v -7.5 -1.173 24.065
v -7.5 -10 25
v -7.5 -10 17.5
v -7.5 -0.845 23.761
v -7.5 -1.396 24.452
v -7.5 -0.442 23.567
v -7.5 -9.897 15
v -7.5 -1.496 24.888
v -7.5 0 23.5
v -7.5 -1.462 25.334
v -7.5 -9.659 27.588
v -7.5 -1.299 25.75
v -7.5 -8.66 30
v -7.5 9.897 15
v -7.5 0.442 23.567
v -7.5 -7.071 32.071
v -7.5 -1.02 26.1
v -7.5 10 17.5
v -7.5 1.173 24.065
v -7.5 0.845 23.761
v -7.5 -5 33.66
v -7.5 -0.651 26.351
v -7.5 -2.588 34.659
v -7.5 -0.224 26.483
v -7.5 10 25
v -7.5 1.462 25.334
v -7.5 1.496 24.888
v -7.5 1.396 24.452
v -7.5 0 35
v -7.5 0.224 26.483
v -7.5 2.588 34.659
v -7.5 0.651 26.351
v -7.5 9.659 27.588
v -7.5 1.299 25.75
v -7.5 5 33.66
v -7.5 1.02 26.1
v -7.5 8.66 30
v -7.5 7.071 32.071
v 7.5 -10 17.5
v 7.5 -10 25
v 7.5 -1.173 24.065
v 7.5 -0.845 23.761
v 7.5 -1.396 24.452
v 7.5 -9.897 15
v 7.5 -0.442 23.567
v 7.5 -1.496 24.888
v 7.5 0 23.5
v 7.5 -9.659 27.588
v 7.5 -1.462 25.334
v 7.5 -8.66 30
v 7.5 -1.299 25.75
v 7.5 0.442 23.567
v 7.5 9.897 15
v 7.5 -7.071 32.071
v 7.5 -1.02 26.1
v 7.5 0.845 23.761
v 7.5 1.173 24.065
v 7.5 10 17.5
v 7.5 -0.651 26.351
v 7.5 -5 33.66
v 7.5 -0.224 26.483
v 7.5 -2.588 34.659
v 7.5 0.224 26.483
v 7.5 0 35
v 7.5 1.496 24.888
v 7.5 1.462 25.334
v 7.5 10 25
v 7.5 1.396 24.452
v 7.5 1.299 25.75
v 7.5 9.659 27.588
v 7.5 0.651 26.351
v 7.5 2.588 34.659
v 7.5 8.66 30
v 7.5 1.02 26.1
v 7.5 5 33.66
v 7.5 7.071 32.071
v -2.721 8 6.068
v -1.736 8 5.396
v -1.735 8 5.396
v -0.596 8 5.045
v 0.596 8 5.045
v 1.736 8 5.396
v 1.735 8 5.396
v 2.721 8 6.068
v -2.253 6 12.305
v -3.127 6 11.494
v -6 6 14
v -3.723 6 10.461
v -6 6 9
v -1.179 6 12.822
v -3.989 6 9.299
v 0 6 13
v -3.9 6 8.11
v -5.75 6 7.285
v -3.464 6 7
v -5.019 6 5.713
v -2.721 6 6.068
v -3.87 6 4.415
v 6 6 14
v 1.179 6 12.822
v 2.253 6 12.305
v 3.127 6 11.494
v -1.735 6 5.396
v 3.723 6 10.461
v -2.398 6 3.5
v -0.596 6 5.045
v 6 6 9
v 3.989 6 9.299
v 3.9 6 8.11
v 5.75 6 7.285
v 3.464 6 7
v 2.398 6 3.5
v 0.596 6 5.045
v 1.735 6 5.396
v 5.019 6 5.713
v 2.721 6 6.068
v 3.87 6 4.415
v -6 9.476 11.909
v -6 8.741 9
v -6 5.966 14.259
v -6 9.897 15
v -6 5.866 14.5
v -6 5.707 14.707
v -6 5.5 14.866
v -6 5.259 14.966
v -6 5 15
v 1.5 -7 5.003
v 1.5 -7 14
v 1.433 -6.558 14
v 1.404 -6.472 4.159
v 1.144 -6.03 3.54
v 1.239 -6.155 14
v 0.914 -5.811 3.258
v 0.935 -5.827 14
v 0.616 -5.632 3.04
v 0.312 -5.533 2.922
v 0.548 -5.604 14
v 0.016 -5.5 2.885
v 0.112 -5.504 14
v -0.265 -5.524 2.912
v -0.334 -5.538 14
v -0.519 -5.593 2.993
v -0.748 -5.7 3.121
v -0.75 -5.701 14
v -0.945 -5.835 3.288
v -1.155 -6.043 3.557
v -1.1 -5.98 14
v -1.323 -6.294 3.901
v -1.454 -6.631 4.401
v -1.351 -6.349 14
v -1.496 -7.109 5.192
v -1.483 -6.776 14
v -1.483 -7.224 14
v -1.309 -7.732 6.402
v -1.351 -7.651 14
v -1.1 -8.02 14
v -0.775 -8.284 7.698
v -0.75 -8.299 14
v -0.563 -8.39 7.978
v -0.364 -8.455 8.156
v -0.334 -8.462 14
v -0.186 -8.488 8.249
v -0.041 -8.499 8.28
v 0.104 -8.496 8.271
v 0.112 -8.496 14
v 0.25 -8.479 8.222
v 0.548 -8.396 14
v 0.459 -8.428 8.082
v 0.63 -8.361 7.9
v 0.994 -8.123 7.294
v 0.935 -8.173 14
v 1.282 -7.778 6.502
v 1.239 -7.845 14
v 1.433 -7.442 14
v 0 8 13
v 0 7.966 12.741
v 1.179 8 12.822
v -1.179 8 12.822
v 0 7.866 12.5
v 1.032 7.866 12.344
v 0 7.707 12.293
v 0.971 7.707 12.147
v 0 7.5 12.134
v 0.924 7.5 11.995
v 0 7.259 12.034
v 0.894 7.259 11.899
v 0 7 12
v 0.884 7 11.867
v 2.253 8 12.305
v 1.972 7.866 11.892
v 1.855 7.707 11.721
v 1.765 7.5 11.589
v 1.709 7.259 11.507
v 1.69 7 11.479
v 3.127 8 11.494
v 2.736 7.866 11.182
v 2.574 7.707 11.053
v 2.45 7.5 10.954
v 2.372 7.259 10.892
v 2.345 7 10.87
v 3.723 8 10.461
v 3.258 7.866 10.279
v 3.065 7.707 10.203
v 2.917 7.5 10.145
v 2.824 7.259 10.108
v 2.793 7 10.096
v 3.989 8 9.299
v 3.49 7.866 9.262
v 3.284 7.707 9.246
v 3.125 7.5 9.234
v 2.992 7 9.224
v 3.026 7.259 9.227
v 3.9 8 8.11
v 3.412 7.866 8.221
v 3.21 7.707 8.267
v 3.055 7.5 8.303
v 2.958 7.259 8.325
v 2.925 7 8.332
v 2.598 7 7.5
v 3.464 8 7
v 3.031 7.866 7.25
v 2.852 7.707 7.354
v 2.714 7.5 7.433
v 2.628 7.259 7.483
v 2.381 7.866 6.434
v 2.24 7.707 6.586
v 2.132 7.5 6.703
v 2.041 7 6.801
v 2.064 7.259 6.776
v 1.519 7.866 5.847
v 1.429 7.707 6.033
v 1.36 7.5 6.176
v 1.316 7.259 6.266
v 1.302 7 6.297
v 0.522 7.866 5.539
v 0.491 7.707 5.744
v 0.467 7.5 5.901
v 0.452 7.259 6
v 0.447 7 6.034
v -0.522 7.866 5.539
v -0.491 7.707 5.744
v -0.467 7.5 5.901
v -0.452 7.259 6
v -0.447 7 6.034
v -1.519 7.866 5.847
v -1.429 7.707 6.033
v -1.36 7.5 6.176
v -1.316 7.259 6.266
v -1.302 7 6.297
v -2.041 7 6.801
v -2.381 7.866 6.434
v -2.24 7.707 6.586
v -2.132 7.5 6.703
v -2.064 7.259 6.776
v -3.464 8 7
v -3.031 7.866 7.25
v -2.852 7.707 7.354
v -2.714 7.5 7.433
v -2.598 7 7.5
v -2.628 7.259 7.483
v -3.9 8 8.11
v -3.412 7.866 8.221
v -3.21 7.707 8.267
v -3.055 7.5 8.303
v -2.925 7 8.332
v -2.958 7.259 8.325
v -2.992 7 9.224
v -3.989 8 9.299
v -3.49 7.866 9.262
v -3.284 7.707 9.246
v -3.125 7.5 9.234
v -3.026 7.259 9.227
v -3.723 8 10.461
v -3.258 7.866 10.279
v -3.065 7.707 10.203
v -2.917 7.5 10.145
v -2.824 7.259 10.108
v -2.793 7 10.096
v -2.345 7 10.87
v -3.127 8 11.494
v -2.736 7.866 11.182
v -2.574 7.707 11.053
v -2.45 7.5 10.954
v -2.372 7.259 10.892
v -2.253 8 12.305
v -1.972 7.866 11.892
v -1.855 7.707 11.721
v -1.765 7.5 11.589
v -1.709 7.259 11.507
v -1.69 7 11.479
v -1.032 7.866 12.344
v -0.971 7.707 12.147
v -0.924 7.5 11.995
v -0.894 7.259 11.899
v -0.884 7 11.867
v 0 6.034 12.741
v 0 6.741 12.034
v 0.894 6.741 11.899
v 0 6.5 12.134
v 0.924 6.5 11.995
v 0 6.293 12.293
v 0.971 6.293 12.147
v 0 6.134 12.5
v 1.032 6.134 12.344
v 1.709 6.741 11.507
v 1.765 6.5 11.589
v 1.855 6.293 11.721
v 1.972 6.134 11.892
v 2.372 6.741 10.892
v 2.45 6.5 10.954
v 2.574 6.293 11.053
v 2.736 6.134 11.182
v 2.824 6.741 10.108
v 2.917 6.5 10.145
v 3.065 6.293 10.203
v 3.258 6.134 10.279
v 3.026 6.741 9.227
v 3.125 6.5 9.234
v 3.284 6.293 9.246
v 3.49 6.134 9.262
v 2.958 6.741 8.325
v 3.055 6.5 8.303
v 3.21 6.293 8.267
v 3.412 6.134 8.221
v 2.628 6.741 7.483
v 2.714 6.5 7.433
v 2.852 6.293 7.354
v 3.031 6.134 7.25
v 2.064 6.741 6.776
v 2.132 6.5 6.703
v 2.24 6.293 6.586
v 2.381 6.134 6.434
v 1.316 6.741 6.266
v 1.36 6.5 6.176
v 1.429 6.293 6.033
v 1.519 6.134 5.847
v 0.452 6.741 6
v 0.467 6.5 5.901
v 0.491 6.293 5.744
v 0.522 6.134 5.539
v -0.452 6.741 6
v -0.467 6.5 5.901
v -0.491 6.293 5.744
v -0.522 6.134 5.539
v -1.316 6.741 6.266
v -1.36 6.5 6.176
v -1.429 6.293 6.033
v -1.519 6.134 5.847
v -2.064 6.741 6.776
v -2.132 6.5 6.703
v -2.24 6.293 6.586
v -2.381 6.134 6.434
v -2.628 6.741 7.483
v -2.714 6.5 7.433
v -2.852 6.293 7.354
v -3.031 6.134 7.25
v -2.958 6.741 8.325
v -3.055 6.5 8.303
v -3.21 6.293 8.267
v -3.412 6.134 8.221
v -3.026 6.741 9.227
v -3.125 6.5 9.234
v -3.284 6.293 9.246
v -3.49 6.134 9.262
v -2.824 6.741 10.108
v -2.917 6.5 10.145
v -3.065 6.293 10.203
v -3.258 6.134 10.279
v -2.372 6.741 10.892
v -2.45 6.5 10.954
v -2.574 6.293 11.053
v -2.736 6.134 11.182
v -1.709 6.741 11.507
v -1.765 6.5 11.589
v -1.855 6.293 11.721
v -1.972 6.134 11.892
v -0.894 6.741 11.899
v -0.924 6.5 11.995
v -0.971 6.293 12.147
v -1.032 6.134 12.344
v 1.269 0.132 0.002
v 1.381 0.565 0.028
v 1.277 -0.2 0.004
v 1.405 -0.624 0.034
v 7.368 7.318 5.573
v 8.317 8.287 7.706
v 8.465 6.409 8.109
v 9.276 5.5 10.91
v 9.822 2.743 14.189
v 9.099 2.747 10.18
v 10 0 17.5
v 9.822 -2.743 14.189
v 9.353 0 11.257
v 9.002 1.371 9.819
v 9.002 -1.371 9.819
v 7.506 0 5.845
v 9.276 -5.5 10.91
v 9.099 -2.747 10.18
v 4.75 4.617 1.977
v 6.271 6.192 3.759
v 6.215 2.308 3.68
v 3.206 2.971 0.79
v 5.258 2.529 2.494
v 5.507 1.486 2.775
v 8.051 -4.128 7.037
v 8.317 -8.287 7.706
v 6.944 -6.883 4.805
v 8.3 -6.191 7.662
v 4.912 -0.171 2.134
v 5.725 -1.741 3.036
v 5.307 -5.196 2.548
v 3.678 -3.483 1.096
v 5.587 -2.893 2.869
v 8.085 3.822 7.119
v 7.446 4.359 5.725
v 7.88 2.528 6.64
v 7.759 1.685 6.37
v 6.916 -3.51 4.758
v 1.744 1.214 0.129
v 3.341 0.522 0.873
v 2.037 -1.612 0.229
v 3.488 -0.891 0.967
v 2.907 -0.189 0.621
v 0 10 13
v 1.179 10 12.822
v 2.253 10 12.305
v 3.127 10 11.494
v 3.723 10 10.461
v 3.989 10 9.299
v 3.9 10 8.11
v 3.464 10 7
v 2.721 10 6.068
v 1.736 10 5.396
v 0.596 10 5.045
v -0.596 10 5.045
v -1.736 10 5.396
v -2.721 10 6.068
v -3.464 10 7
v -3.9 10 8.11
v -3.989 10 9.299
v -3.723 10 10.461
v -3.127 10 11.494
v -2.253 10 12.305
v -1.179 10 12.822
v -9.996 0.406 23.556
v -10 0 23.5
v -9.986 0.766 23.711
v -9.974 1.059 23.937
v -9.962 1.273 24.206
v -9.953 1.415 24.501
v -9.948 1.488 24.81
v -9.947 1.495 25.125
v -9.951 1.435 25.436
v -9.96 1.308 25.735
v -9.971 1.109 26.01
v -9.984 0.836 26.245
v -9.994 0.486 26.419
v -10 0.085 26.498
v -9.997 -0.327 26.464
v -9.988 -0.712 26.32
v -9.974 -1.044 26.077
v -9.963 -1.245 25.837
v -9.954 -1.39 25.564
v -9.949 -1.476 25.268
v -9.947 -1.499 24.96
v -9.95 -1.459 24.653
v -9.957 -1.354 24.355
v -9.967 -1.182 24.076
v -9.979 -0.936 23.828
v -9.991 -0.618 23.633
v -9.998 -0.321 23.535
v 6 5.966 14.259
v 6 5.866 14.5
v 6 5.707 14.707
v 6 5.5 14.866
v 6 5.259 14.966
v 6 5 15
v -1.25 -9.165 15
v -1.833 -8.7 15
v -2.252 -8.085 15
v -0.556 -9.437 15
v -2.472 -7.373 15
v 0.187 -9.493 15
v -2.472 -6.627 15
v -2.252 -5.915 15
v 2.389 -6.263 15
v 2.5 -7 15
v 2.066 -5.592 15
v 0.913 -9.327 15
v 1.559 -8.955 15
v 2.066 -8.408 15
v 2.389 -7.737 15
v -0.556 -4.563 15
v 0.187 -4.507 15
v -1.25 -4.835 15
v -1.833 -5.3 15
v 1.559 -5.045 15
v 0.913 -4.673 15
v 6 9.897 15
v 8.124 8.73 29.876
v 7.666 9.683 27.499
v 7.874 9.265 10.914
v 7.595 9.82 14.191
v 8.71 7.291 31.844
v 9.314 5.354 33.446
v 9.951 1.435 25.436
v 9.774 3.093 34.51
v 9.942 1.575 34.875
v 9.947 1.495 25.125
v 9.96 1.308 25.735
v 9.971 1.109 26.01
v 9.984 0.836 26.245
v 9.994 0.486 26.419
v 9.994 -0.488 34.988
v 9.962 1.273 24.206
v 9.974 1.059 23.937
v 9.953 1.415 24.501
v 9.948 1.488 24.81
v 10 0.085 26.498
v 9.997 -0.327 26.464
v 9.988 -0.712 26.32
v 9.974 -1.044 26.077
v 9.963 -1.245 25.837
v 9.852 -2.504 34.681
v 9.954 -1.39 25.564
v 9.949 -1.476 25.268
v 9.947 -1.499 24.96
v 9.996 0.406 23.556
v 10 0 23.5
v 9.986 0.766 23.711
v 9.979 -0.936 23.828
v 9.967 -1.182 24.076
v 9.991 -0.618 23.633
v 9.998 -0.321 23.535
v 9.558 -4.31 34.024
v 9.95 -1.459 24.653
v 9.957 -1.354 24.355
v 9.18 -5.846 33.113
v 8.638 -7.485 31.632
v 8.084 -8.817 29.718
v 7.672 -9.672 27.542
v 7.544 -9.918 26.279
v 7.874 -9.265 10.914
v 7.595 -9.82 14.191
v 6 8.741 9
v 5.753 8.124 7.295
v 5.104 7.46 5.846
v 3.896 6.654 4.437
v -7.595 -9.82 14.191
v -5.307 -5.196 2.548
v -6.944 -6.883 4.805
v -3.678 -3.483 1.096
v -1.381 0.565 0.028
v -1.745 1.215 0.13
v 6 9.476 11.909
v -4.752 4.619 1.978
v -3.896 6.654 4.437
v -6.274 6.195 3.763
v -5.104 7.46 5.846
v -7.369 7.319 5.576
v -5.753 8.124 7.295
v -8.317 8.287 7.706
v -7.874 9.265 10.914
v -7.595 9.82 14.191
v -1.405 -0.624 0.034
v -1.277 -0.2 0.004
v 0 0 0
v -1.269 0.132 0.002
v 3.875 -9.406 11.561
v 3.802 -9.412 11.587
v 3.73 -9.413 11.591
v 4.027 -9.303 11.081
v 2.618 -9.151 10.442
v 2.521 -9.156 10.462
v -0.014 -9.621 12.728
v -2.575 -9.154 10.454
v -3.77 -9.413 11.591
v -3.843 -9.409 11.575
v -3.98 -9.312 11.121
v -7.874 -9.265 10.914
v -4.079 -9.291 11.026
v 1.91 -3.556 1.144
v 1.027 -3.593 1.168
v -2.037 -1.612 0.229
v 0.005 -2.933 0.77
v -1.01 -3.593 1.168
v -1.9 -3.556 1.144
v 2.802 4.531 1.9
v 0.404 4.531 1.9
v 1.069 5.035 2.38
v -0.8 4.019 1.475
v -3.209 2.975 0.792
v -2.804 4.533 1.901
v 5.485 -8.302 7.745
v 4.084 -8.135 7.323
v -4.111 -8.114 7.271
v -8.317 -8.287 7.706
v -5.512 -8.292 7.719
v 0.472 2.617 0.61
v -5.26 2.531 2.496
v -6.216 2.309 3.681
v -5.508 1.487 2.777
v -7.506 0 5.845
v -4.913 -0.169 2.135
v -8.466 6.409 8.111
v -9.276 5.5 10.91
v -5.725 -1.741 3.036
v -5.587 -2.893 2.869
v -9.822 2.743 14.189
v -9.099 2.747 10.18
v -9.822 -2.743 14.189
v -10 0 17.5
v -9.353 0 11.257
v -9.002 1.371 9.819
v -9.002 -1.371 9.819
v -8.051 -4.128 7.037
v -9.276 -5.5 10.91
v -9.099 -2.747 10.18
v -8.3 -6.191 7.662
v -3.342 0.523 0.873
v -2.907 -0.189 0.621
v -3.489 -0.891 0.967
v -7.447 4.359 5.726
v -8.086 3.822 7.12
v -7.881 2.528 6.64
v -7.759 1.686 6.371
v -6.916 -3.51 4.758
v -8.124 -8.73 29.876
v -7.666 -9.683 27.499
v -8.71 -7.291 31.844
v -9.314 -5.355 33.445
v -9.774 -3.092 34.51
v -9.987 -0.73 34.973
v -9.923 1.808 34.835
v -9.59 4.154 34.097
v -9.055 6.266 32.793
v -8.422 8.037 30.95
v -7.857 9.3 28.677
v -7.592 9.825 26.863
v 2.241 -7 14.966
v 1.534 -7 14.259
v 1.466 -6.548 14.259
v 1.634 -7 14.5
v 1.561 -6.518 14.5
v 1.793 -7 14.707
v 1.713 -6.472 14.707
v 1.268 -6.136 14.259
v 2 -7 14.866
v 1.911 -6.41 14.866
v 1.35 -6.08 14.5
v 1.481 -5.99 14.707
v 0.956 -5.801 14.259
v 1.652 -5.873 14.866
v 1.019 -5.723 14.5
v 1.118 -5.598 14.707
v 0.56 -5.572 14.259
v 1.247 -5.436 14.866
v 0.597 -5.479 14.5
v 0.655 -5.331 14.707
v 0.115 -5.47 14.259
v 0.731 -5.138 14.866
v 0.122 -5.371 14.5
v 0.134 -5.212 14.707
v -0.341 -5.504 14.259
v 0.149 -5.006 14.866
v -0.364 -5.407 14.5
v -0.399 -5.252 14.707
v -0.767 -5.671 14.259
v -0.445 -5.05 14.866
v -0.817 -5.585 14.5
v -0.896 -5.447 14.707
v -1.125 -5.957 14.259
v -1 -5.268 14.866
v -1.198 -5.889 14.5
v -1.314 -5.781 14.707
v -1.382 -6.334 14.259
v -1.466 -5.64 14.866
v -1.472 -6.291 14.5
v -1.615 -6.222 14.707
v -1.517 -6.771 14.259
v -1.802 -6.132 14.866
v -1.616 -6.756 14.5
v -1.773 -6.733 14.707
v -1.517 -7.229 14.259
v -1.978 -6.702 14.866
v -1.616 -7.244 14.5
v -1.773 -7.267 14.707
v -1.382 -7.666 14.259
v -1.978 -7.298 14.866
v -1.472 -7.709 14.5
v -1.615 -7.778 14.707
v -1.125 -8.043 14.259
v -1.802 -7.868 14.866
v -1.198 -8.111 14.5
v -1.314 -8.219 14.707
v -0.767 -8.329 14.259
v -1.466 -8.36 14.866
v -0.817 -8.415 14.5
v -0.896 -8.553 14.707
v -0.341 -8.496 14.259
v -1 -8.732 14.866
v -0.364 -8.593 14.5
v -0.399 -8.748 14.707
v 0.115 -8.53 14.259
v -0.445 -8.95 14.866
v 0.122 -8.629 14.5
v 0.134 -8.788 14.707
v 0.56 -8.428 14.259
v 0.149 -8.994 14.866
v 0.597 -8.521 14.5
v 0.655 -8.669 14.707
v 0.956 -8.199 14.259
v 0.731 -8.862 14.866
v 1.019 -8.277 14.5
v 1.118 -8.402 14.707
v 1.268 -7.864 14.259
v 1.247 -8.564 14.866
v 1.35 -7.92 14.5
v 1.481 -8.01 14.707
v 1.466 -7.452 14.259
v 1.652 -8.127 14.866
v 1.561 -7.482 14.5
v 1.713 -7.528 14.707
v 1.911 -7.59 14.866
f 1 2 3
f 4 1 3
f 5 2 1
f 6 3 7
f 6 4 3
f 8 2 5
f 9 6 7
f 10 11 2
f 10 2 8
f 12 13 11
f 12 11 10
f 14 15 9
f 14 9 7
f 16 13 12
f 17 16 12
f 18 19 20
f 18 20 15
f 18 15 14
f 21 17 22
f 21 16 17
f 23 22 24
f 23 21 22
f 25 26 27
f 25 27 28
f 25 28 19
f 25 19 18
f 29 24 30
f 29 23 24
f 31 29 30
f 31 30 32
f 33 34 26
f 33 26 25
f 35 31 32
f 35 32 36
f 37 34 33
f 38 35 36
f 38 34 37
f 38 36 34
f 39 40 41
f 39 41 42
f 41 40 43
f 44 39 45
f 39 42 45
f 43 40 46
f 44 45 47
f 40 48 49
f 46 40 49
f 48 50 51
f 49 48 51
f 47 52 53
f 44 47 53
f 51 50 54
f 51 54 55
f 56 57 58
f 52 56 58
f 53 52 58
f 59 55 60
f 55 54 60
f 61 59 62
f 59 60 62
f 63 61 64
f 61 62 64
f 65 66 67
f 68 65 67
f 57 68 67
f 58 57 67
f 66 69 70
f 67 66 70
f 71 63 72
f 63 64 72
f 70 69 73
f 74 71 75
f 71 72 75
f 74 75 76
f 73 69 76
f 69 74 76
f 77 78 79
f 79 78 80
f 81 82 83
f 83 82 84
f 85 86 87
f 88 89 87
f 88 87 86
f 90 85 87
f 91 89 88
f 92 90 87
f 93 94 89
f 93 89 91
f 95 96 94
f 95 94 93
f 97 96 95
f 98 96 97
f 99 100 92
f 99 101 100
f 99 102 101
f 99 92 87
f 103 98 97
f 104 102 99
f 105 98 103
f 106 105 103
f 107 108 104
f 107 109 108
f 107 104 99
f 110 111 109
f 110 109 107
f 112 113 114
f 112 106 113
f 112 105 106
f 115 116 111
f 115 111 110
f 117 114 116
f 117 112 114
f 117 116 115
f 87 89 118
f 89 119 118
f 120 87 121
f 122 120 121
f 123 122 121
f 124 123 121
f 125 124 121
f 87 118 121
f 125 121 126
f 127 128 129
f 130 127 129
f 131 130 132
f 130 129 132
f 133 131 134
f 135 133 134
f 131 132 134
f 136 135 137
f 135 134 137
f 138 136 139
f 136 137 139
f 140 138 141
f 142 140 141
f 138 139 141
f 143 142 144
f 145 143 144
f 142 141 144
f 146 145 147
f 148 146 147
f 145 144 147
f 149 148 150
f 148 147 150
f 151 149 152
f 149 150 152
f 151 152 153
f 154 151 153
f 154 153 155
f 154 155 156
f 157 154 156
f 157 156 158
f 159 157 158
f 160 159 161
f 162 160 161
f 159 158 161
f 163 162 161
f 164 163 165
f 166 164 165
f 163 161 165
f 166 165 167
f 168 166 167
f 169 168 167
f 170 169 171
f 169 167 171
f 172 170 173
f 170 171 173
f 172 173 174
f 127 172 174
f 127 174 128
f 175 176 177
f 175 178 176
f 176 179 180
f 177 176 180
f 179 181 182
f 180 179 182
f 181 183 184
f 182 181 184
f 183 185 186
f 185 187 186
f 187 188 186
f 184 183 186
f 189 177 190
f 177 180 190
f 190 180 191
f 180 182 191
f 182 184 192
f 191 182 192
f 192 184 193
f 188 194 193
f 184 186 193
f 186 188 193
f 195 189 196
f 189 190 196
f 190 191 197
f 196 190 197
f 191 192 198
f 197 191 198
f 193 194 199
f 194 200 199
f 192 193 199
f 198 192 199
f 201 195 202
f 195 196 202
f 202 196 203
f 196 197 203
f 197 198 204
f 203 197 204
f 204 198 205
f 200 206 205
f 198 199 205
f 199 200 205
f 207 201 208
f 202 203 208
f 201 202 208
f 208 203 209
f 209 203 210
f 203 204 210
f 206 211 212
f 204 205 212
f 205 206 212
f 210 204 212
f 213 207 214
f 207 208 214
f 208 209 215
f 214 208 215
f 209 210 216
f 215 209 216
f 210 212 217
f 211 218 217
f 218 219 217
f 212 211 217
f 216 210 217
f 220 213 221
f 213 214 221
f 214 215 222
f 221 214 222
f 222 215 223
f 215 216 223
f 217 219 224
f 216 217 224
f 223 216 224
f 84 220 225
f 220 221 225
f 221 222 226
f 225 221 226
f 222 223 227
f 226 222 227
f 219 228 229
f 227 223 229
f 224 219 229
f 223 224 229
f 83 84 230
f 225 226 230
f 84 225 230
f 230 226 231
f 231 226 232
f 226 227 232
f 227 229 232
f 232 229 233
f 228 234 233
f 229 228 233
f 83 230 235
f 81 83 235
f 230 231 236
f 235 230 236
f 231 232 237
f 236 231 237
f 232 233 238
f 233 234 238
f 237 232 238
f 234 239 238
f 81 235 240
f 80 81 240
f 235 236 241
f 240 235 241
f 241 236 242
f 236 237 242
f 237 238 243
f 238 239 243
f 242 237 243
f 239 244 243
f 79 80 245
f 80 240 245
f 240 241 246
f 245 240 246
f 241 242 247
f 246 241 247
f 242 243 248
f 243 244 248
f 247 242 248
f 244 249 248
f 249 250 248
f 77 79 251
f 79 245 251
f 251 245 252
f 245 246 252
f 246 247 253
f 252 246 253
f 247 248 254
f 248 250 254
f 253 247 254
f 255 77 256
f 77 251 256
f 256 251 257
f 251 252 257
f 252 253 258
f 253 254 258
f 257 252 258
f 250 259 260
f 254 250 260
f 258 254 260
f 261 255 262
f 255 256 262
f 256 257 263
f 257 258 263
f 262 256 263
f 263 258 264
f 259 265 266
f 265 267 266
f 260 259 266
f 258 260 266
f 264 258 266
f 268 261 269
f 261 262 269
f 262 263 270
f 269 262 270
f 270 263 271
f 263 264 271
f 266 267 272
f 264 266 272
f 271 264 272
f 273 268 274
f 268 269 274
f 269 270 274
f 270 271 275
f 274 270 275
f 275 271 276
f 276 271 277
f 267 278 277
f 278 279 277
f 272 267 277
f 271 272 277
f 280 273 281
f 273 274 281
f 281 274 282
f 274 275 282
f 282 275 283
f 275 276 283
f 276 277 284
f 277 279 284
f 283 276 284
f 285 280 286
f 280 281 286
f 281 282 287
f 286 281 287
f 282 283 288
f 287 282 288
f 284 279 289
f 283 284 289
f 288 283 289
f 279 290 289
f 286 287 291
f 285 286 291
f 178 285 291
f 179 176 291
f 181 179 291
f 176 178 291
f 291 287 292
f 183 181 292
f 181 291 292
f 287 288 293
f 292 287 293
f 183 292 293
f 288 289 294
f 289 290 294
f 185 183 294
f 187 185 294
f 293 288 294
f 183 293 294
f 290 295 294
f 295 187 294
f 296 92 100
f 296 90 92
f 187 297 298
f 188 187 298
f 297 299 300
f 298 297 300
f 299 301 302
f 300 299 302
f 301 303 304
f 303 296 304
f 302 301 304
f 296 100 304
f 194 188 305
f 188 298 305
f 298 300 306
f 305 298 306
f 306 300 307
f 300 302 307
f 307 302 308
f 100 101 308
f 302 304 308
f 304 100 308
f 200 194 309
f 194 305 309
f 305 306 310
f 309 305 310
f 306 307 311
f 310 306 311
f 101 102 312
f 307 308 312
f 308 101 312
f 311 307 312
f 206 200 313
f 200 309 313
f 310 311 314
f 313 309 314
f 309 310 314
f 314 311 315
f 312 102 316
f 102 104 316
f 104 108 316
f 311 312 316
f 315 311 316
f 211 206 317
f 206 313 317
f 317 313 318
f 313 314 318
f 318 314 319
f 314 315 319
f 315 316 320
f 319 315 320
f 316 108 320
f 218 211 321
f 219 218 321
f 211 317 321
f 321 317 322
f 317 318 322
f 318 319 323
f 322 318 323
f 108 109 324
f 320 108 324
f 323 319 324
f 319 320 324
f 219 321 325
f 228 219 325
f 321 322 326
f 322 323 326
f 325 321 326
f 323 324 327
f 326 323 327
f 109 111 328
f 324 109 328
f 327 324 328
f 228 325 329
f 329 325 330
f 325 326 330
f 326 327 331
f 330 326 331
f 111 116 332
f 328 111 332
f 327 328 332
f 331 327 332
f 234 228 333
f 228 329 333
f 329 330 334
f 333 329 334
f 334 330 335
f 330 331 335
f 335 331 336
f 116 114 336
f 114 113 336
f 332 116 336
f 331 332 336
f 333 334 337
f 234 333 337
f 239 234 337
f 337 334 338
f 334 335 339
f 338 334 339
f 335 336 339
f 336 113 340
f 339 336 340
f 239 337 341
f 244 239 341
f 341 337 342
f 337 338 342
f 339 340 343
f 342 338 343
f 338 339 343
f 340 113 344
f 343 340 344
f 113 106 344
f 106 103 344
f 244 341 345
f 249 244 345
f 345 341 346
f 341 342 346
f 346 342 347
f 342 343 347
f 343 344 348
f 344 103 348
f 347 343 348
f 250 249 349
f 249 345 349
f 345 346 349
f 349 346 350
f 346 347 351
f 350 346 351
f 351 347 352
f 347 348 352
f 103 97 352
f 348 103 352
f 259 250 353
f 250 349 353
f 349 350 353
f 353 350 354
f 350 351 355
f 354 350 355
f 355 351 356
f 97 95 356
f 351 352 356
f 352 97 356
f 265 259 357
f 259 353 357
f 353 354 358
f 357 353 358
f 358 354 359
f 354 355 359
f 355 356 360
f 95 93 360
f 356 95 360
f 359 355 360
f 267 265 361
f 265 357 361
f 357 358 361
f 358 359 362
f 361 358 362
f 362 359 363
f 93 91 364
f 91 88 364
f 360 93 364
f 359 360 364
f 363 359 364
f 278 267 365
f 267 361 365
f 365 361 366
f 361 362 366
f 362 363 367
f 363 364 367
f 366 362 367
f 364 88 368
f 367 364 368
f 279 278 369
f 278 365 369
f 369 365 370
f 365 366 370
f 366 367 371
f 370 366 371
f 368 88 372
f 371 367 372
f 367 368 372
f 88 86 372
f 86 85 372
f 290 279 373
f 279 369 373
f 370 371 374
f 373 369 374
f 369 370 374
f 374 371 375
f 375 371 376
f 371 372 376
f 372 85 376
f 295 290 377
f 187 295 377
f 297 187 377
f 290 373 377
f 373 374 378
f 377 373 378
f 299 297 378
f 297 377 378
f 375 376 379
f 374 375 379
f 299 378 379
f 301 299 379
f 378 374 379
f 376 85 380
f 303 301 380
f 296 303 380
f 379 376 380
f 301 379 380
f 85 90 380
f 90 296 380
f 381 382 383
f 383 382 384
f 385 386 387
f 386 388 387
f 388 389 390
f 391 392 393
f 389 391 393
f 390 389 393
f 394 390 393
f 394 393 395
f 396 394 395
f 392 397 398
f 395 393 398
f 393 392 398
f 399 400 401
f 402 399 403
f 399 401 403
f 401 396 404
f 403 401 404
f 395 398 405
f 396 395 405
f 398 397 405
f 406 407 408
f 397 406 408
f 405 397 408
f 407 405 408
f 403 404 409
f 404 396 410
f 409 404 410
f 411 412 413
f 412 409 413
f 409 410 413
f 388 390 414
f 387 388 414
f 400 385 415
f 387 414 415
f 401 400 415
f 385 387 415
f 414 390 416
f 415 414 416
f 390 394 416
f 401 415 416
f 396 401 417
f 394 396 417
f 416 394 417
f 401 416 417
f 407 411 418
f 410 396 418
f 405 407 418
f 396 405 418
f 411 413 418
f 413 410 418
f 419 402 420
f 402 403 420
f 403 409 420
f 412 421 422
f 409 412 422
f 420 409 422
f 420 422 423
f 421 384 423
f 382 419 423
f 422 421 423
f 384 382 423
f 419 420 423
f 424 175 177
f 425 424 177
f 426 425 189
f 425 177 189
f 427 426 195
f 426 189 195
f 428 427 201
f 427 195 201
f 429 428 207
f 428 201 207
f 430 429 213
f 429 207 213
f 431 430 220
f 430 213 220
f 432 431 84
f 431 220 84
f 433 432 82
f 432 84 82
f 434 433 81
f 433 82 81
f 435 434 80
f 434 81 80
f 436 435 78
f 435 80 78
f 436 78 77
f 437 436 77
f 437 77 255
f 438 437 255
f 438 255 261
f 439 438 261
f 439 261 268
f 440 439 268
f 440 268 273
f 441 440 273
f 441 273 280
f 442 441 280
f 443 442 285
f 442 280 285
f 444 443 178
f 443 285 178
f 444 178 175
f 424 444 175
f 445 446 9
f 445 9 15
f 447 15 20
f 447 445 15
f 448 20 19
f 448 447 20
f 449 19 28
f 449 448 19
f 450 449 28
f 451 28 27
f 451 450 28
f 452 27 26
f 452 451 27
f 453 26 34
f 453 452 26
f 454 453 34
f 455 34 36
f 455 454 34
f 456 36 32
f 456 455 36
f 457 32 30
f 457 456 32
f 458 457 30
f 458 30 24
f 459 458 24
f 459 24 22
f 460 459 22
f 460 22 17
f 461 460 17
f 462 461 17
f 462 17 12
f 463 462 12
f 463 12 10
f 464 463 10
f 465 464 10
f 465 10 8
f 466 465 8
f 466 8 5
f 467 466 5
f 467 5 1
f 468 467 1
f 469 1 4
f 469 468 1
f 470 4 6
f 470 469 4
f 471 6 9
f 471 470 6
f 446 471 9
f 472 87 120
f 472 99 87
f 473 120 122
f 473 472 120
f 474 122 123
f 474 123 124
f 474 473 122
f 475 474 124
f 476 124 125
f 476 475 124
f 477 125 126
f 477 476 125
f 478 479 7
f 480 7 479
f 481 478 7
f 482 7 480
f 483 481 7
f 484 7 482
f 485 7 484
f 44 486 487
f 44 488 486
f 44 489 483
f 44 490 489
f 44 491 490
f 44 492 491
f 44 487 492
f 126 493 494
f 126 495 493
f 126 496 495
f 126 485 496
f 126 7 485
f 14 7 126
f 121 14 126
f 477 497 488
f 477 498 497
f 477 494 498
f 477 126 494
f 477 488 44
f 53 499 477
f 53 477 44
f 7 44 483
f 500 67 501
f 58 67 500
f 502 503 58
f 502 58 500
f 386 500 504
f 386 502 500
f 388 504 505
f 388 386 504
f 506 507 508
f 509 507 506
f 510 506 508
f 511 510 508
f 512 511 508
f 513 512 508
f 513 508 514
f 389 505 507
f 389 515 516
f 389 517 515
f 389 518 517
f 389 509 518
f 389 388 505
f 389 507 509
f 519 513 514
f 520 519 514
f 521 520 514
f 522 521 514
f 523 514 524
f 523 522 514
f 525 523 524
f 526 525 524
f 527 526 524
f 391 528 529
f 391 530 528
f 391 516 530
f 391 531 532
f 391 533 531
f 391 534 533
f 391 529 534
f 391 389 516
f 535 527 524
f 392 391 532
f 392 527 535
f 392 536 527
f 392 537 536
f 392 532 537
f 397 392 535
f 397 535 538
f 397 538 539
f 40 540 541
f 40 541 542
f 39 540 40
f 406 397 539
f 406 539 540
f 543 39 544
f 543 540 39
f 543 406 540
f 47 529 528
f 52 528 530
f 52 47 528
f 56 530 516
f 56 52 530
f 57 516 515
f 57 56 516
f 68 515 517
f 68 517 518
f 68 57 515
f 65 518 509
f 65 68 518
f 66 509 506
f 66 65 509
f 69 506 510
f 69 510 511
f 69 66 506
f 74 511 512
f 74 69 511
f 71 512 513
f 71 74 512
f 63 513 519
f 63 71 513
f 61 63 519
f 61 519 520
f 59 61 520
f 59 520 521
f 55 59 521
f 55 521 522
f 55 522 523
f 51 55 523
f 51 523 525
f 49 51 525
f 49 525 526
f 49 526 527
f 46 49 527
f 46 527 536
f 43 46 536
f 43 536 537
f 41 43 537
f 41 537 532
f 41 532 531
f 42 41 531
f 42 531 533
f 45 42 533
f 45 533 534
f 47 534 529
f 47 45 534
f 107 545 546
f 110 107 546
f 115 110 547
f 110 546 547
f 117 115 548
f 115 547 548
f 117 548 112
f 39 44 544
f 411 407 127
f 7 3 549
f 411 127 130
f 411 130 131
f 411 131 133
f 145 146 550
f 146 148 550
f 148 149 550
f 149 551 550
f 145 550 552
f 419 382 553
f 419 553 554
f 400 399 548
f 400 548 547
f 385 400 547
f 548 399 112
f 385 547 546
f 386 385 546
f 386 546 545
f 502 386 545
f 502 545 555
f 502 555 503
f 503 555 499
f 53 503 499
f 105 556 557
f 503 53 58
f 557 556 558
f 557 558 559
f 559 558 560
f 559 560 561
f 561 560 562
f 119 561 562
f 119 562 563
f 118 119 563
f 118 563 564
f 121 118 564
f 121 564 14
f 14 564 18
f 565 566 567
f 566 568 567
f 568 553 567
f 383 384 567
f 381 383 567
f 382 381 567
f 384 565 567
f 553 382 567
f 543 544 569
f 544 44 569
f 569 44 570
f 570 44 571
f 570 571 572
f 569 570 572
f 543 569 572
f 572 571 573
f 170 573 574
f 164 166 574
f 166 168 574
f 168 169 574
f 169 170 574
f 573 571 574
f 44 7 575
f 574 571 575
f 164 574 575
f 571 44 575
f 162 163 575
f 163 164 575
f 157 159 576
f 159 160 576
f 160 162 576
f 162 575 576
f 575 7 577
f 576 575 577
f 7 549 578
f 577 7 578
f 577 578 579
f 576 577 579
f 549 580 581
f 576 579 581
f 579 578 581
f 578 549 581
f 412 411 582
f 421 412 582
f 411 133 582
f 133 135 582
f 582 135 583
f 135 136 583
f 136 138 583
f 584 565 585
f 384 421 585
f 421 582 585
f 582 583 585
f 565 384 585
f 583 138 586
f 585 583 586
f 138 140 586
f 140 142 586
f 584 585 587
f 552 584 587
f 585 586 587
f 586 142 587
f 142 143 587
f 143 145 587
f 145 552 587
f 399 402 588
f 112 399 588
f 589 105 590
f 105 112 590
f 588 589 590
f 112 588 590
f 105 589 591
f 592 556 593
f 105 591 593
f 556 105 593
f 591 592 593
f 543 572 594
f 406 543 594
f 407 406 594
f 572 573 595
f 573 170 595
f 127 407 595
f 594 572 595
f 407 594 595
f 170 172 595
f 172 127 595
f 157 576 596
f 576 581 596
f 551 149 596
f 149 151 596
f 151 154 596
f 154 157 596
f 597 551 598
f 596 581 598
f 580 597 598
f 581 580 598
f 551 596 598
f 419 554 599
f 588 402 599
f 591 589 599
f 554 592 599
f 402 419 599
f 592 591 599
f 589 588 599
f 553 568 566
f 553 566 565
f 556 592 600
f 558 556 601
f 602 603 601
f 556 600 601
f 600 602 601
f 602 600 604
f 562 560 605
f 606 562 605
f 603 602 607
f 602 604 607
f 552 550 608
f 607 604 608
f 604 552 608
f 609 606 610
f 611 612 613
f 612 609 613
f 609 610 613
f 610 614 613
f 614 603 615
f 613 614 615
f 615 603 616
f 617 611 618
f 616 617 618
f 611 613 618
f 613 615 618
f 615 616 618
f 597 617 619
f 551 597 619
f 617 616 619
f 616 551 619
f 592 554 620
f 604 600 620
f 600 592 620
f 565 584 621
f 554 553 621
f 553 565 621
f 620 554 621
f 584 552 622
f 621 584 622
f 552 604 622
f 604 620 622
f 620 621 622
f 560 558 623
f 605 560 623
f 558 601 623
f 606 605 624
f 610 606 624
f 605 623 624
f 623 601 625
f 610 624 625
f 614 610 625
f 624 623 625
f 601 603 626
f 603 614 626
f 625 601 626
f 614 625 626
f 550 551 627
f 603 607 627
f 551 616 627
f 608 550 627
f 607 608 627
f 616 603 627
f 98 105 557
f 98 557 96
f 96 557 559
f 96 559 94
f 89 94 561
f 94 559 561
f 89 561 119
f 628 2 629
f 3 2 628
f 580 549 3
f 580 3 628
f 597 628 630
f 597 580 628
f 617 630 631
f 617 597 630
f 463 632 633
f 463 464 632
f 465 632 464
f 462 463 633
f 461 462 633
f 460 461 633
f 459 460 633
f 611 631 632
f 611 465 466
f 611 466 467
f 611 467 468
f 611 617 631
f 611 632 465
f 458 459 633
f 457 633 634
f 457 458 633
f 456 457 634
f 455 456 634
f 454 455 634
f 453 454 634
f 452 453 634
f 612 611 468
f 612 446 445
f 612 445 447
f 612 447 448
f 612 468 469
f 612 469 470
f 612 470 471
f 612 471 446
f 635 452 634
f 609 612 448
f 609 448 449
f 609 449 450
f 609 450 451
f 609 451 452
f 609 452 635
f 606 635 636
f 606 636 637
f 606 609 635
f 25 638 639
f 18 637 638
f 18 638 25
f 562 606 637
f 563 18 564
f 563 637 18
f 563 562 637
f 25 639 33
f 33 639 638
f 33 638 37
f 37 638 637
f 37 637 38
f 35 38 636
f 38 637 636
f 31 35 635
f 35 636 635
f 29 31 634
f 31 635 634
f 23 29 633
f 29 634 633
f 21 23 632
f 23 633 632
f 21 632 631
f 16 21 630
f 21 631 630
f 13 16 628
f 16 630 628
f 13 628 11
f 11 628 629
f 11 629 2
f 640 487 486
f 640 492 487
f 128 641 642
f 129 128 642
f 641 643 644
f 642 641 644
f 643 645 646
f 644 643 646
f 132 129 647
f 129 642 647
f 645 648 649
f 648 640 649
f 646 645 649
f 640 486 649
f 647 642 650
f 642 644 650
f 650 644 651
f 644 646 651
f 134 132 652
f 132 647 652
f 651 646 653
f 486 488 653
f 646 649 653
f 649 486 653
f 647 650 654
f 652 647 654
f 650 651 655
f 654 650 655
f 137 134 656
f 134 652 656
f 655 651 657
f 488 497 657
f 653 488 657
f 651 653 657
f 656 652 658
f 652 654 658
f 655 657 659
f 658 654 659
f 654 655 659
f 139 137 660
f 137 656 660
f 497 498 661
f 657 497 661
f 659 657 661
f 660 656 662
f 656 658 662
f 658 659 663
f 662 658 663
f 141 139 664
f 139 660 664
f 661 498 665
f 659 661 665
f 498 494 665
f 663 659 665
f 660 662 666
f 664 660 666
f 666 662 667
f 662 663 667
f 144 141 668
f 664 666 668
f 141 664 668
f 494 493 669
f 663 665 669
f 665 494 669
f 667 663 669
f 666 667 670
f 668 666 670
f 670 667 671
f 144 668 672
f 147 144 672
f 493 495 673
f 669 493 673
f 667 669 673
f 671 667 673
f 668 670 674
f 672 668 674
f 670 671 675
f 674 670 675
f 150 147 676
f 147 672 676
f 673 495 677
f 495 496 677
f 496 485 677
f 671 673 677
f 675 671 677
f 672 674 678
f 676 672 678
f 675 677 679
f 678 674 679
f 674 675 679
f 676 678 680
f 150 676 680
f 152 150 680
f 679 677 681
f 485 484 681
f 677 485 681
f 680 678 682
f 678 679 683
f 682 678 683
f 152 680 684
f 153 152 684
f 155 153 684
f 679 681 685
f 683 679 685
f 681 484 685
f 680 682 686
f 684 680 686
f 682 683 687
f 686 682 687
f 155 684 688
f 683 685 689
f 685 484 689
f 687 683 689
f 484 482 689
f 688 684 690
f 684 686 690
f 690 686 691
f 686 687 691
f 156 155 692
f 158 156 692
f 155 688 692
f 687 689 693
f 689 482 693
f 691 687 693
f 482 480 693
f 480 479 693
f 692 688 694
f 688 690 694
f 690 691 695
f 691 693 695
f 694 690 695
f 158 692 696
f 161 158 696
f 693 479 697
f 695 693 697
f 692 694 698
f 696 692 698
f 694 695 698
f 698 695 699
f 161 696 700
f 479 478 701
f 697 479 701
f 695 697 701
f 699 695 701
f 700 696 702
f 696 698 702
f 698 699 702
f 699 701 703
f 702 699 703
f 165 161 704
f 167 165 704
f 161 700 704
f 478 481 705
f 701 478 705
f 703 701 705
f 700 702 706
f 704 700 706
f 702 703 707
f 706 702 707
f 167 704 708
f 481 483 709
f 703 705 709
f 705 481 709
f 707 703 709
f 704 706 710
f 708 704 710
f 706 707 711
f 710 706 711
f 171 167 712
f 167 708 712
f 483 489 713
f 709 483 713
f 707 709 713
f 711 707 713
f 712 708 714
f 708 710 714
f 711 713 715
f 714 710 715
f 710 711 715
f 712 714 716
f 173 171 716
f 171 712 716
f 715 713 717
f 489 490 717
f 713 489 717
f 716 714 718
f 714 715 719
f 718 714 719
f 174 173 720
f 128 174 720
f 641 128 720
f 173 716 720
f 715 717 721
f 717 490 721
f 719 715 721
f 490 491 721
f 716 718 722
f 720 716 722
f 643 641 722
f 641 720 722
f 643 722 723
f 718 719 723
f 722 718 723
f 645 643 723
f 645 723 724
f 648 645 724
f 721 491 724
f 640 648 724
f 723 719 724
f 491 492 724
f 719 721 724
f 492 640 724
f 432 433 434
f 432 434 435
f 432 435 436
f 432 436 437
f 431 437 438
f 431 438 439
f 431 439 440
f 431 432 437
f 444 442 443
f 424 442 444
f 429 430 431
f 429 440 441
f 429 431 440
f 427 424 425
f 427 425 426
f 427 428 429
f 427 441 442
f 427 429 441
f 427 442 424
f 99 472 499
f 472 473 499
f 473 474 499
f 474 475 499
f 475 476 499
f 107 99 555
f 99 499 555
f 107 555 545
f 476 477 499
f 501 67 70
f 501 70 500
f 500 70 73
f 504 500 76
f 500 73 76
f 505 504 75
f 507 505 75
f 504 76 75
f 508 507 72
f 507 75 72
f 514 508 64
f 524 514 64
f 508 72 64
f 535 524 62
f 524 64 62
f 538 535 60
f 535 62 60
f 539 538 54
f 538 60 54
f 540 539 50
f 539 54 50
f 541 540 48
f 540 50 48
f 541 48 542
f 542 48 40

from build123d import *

# Parameters (mm, degrees)
SALIENTE_EXTRUIR1_DEPTH    = 35
CROQUIS3_R                 = 1.5
CORTAR_EXTRUIR2_DEPTH      = 38.749172176
CROQUIS6_W                 = 15
CROQUIS6_H                 = 20
CORTAR_EXTRUIR4_DEPTH      = 20
CORTAR_EXTRUIR5_DEPTH      = 38.749172176
CORTAR_EXTRUIR5_DEPTH_BACK = 38.749172176
CROQUIS7_R                 = 1.5
CORTAR_EXTRUIR1_DEPTH      = 38.749172328
CORTAR_EXTRUIR1_DEPTH_BACK = 38.749172328
CORTAR_EXTRUIR3_DEPTH      = 38.749172461
CORTAR_EXTRUIR3_DEPTH_BACK = 38.749172461
CUT_EXTRUDE1_DEPTH         = 4
SKETCH2_R                  = 3
BOSS_EXTRUDE1_DEPTH        = 2
SKETCH3_R                  = 4
BOSS_EXTRUDE2_DEPTH        = 2
FILLET1_R                  = 1
FILLET2_R                  = 1
FILLET4_R                  = 1


with BuildPart() as part:
    # Croquis1 → Saliente-Extruir1 (new body)
    with BuildSketch(Plane.XY):
        with BuildLine():
            Line((-7.5, 10), (7.5, 10))
            ThreePointArc((7.5, 10), (10, 0), (7.5, -10))
            Line((7.5, -10), (-7.5, -10))
            ThreePointArc((-7.5, -10), (-10, 0), (-7.5, 10))
        make_face()
    extrude(amount=SALIENTE_EXTRUIR1_DEPTH)

    # Croquis3 → Cortar-Extruir2 (cut, through all)
    with BuildSketch(Plane.XY.offset(35)):
        with Locations((0, -7)):
            Circle(CROQUIS3_R)
    extrude(amount=-CORTAR_EXTRUIR2_DEPTH, mode=Mode.SUBTRACT)

    # Croquis6 → Cortar-Extruir4 (cut)
    with BuildSketch(Plane.XY.offset(35)):
        Rectangle(CROQUIS6_W, CROQUIS6_H)
    extrude(amount=-CORTAR_EXTRUIR4_DEPTH, mode=Mode.SUBTRACT)

    # Croquis7 → Cortar-Extruir5 (cut, two sides: drawn at the far end of the back side and taken through both)
    with BuildSketch(Plane(origin=(0, 0, 0), x_dir=(0, 0, -1), z_dir=(1, 0, 0)).offset(-CORTAR_EXTRUIR5_DEPTH_BACK)):
        with Locations((-25, 0)):
            Circle(CROQUIS7_R)
        with BuildLine():
            Line((-25, -10), (-41, -10))
            Line((-41, -10), (-41, 10))
            Line((-41, 10), (-25, 10))
            ThreePointArc((-25, 10), (-35, 0), (-25, -10))
        make_face()
    extrude(amount=CORTAR_EXTRUIR5_DEPTH + CORTAR_EXTRUIR5_DEPTH_BACK, mode=Mode.SUBTRACT)

    # Croquis2 → Cortar-Extruir1 (cut, two sides: drawn at the far end of the back side and taken through both)
    with BuildSketch(Plane(origin=(0, 0, 0), x_dir=(1, 0, 0), z_dir=(0, 1, 0)).offset(-CORTAR_EXTRUIR1_DEPTH_BACK)):
        with BuildLine():
            Line((-1.261783996, 0), (1.261783996, 0))
            add(Edge.make_bspline(
                [(10, -17.5), (10, -1.960721315), (1.261783996, 0)],
                knots=[4.71238898, 4.71238898, 4.71238898, 6.156669672, 6.156669672, 6.156669672], degree=2, weights=[1, 0.750392697, 1]))
            Line((10, -17.5), (10, 3.270111557))
            Line((10, 3.270111557), (-10, 3.270111557))
            Line((-10, 3.270111557), (-10, -17.5))
            add(Edge.make_bspline(
                [(-1.261783996, 0), (-10, -1.960721315), (-10, -17.5)],
                knots=[0.126515635, 0.126515635, 0.126515635, 1.570796327, 1.570796327, 1.570796327], degree=2, weights=[1, 0.750392697, 1]))
        make_face()
    extrude(amount=CORTAR_EXTRUIR1_DEPTH + CORTAR_EXTRUIR1_DEPTH_BACK, mode=Mode.SUBTRACT)

    # Croquis5 → Cortar-Extruir3 (cut, two sides: drawn at the far end of the back side and taken through both)
    with BuildSketch(Plane(origin=(0, 0, 0), x_dir=(0, 0, -1), z_dir=(1, 0, 0)).offset(-CORTAR_EXTRUIR3_DEPTH_BACK)):
        with BuildLine():
            Line((-17.5, -10), (6.249957369, -10))
            Line((6.249957369, -10), (6.249957369, 10))
            Line((6.249957369, 10), (-17.5, 10))
            add(Edge.make_bspline(
                [(-17.5, -10), (0, -10), (0, 0), (0, 10), (-17.5, 10)],
                knots=[4.71238898, 4.71238898, 4.71238898, 6.283185307, 6.283185307, 7.853981634, 7.853981634, 7.853981634], degree=2, weights=[1, 0.707106781, 1, 0.707106781, 1]))
        make_face()
    extrude(amount=CORTAR_EXTRUIR3_DEPTH + CORTAR_EXTRUIR3_DEPTH_BACK, mode=Mode.SUBTRACT)

    # Sketch1 → Cut-Extrude1 (cut)
    with BuildSketch(Plane(origin=(0, 10, 0), x_dir=(1, 0, 0), z_dir=(0, 1, 0))):
        with BuildLine():
            Line((-6, -9), (-6, -15))
            Line((-6, -15), (6, -15))
            Line((6, -15), (6, -9))
            ThreePointArc((6, -9), (0, -3), (-6, -9))
        make_face()
    extrude(amount=-CUT_EXTRUDE1_DEPTH, mode=Mode.SUBTRACT)

    # Sketch2 → Boss-Extrude1 (add)
    with BuildSketch(Plane(origin=(0, 6, 0), x_dir=(1, 0, 0), z_dir=(0, 1, 0))):
        with Locations(Location((0, -9, 0), (0, 0, 270))):
            Circle(SKETCH2_R)
    extrude(amount=BOSS_EXTRUDE1_DEPTH)

    # Sketch3 → Boss-Extrude2 (add)
    with BuildSketch(Plane(origin=(0, 8, 0), x_dir=(1, 0, 0), z_dir=(0, 1, 0))):
        with Locations(Location((0, -9, 0), (0, 0, 270))):
            Circle(SKETCH3_R)
    extrude(amount=BOSS_EXTRUDE2_DEPTH)

    # Fillet1
    fillet1_edges = [part.edges().sort_by_distance(p)[0] for p in [
        (0, 6, 6),
        (0, 8, 6),
    ]]
    fillet(fillet1_edges, radius=FILLET1_R - 0.0001)  # a hair under: the kernel refuses the full size

    # Fillet2
    fillet2_edges = [part.edges().sort_by_distance(p)[0] for p in [
        (0, 6, 15),
    ]]
    fillet(fillet2_edges, radius=FILLET2_R)

    # Fillet4
    fillet4_edges = [part.edges().sort_by_distance(p)[0] for p in [
        (-1.5, -7, 15),
    ]]
    fillet(fillet4_edges, radius=FILLET4_R)


solid = part.part
